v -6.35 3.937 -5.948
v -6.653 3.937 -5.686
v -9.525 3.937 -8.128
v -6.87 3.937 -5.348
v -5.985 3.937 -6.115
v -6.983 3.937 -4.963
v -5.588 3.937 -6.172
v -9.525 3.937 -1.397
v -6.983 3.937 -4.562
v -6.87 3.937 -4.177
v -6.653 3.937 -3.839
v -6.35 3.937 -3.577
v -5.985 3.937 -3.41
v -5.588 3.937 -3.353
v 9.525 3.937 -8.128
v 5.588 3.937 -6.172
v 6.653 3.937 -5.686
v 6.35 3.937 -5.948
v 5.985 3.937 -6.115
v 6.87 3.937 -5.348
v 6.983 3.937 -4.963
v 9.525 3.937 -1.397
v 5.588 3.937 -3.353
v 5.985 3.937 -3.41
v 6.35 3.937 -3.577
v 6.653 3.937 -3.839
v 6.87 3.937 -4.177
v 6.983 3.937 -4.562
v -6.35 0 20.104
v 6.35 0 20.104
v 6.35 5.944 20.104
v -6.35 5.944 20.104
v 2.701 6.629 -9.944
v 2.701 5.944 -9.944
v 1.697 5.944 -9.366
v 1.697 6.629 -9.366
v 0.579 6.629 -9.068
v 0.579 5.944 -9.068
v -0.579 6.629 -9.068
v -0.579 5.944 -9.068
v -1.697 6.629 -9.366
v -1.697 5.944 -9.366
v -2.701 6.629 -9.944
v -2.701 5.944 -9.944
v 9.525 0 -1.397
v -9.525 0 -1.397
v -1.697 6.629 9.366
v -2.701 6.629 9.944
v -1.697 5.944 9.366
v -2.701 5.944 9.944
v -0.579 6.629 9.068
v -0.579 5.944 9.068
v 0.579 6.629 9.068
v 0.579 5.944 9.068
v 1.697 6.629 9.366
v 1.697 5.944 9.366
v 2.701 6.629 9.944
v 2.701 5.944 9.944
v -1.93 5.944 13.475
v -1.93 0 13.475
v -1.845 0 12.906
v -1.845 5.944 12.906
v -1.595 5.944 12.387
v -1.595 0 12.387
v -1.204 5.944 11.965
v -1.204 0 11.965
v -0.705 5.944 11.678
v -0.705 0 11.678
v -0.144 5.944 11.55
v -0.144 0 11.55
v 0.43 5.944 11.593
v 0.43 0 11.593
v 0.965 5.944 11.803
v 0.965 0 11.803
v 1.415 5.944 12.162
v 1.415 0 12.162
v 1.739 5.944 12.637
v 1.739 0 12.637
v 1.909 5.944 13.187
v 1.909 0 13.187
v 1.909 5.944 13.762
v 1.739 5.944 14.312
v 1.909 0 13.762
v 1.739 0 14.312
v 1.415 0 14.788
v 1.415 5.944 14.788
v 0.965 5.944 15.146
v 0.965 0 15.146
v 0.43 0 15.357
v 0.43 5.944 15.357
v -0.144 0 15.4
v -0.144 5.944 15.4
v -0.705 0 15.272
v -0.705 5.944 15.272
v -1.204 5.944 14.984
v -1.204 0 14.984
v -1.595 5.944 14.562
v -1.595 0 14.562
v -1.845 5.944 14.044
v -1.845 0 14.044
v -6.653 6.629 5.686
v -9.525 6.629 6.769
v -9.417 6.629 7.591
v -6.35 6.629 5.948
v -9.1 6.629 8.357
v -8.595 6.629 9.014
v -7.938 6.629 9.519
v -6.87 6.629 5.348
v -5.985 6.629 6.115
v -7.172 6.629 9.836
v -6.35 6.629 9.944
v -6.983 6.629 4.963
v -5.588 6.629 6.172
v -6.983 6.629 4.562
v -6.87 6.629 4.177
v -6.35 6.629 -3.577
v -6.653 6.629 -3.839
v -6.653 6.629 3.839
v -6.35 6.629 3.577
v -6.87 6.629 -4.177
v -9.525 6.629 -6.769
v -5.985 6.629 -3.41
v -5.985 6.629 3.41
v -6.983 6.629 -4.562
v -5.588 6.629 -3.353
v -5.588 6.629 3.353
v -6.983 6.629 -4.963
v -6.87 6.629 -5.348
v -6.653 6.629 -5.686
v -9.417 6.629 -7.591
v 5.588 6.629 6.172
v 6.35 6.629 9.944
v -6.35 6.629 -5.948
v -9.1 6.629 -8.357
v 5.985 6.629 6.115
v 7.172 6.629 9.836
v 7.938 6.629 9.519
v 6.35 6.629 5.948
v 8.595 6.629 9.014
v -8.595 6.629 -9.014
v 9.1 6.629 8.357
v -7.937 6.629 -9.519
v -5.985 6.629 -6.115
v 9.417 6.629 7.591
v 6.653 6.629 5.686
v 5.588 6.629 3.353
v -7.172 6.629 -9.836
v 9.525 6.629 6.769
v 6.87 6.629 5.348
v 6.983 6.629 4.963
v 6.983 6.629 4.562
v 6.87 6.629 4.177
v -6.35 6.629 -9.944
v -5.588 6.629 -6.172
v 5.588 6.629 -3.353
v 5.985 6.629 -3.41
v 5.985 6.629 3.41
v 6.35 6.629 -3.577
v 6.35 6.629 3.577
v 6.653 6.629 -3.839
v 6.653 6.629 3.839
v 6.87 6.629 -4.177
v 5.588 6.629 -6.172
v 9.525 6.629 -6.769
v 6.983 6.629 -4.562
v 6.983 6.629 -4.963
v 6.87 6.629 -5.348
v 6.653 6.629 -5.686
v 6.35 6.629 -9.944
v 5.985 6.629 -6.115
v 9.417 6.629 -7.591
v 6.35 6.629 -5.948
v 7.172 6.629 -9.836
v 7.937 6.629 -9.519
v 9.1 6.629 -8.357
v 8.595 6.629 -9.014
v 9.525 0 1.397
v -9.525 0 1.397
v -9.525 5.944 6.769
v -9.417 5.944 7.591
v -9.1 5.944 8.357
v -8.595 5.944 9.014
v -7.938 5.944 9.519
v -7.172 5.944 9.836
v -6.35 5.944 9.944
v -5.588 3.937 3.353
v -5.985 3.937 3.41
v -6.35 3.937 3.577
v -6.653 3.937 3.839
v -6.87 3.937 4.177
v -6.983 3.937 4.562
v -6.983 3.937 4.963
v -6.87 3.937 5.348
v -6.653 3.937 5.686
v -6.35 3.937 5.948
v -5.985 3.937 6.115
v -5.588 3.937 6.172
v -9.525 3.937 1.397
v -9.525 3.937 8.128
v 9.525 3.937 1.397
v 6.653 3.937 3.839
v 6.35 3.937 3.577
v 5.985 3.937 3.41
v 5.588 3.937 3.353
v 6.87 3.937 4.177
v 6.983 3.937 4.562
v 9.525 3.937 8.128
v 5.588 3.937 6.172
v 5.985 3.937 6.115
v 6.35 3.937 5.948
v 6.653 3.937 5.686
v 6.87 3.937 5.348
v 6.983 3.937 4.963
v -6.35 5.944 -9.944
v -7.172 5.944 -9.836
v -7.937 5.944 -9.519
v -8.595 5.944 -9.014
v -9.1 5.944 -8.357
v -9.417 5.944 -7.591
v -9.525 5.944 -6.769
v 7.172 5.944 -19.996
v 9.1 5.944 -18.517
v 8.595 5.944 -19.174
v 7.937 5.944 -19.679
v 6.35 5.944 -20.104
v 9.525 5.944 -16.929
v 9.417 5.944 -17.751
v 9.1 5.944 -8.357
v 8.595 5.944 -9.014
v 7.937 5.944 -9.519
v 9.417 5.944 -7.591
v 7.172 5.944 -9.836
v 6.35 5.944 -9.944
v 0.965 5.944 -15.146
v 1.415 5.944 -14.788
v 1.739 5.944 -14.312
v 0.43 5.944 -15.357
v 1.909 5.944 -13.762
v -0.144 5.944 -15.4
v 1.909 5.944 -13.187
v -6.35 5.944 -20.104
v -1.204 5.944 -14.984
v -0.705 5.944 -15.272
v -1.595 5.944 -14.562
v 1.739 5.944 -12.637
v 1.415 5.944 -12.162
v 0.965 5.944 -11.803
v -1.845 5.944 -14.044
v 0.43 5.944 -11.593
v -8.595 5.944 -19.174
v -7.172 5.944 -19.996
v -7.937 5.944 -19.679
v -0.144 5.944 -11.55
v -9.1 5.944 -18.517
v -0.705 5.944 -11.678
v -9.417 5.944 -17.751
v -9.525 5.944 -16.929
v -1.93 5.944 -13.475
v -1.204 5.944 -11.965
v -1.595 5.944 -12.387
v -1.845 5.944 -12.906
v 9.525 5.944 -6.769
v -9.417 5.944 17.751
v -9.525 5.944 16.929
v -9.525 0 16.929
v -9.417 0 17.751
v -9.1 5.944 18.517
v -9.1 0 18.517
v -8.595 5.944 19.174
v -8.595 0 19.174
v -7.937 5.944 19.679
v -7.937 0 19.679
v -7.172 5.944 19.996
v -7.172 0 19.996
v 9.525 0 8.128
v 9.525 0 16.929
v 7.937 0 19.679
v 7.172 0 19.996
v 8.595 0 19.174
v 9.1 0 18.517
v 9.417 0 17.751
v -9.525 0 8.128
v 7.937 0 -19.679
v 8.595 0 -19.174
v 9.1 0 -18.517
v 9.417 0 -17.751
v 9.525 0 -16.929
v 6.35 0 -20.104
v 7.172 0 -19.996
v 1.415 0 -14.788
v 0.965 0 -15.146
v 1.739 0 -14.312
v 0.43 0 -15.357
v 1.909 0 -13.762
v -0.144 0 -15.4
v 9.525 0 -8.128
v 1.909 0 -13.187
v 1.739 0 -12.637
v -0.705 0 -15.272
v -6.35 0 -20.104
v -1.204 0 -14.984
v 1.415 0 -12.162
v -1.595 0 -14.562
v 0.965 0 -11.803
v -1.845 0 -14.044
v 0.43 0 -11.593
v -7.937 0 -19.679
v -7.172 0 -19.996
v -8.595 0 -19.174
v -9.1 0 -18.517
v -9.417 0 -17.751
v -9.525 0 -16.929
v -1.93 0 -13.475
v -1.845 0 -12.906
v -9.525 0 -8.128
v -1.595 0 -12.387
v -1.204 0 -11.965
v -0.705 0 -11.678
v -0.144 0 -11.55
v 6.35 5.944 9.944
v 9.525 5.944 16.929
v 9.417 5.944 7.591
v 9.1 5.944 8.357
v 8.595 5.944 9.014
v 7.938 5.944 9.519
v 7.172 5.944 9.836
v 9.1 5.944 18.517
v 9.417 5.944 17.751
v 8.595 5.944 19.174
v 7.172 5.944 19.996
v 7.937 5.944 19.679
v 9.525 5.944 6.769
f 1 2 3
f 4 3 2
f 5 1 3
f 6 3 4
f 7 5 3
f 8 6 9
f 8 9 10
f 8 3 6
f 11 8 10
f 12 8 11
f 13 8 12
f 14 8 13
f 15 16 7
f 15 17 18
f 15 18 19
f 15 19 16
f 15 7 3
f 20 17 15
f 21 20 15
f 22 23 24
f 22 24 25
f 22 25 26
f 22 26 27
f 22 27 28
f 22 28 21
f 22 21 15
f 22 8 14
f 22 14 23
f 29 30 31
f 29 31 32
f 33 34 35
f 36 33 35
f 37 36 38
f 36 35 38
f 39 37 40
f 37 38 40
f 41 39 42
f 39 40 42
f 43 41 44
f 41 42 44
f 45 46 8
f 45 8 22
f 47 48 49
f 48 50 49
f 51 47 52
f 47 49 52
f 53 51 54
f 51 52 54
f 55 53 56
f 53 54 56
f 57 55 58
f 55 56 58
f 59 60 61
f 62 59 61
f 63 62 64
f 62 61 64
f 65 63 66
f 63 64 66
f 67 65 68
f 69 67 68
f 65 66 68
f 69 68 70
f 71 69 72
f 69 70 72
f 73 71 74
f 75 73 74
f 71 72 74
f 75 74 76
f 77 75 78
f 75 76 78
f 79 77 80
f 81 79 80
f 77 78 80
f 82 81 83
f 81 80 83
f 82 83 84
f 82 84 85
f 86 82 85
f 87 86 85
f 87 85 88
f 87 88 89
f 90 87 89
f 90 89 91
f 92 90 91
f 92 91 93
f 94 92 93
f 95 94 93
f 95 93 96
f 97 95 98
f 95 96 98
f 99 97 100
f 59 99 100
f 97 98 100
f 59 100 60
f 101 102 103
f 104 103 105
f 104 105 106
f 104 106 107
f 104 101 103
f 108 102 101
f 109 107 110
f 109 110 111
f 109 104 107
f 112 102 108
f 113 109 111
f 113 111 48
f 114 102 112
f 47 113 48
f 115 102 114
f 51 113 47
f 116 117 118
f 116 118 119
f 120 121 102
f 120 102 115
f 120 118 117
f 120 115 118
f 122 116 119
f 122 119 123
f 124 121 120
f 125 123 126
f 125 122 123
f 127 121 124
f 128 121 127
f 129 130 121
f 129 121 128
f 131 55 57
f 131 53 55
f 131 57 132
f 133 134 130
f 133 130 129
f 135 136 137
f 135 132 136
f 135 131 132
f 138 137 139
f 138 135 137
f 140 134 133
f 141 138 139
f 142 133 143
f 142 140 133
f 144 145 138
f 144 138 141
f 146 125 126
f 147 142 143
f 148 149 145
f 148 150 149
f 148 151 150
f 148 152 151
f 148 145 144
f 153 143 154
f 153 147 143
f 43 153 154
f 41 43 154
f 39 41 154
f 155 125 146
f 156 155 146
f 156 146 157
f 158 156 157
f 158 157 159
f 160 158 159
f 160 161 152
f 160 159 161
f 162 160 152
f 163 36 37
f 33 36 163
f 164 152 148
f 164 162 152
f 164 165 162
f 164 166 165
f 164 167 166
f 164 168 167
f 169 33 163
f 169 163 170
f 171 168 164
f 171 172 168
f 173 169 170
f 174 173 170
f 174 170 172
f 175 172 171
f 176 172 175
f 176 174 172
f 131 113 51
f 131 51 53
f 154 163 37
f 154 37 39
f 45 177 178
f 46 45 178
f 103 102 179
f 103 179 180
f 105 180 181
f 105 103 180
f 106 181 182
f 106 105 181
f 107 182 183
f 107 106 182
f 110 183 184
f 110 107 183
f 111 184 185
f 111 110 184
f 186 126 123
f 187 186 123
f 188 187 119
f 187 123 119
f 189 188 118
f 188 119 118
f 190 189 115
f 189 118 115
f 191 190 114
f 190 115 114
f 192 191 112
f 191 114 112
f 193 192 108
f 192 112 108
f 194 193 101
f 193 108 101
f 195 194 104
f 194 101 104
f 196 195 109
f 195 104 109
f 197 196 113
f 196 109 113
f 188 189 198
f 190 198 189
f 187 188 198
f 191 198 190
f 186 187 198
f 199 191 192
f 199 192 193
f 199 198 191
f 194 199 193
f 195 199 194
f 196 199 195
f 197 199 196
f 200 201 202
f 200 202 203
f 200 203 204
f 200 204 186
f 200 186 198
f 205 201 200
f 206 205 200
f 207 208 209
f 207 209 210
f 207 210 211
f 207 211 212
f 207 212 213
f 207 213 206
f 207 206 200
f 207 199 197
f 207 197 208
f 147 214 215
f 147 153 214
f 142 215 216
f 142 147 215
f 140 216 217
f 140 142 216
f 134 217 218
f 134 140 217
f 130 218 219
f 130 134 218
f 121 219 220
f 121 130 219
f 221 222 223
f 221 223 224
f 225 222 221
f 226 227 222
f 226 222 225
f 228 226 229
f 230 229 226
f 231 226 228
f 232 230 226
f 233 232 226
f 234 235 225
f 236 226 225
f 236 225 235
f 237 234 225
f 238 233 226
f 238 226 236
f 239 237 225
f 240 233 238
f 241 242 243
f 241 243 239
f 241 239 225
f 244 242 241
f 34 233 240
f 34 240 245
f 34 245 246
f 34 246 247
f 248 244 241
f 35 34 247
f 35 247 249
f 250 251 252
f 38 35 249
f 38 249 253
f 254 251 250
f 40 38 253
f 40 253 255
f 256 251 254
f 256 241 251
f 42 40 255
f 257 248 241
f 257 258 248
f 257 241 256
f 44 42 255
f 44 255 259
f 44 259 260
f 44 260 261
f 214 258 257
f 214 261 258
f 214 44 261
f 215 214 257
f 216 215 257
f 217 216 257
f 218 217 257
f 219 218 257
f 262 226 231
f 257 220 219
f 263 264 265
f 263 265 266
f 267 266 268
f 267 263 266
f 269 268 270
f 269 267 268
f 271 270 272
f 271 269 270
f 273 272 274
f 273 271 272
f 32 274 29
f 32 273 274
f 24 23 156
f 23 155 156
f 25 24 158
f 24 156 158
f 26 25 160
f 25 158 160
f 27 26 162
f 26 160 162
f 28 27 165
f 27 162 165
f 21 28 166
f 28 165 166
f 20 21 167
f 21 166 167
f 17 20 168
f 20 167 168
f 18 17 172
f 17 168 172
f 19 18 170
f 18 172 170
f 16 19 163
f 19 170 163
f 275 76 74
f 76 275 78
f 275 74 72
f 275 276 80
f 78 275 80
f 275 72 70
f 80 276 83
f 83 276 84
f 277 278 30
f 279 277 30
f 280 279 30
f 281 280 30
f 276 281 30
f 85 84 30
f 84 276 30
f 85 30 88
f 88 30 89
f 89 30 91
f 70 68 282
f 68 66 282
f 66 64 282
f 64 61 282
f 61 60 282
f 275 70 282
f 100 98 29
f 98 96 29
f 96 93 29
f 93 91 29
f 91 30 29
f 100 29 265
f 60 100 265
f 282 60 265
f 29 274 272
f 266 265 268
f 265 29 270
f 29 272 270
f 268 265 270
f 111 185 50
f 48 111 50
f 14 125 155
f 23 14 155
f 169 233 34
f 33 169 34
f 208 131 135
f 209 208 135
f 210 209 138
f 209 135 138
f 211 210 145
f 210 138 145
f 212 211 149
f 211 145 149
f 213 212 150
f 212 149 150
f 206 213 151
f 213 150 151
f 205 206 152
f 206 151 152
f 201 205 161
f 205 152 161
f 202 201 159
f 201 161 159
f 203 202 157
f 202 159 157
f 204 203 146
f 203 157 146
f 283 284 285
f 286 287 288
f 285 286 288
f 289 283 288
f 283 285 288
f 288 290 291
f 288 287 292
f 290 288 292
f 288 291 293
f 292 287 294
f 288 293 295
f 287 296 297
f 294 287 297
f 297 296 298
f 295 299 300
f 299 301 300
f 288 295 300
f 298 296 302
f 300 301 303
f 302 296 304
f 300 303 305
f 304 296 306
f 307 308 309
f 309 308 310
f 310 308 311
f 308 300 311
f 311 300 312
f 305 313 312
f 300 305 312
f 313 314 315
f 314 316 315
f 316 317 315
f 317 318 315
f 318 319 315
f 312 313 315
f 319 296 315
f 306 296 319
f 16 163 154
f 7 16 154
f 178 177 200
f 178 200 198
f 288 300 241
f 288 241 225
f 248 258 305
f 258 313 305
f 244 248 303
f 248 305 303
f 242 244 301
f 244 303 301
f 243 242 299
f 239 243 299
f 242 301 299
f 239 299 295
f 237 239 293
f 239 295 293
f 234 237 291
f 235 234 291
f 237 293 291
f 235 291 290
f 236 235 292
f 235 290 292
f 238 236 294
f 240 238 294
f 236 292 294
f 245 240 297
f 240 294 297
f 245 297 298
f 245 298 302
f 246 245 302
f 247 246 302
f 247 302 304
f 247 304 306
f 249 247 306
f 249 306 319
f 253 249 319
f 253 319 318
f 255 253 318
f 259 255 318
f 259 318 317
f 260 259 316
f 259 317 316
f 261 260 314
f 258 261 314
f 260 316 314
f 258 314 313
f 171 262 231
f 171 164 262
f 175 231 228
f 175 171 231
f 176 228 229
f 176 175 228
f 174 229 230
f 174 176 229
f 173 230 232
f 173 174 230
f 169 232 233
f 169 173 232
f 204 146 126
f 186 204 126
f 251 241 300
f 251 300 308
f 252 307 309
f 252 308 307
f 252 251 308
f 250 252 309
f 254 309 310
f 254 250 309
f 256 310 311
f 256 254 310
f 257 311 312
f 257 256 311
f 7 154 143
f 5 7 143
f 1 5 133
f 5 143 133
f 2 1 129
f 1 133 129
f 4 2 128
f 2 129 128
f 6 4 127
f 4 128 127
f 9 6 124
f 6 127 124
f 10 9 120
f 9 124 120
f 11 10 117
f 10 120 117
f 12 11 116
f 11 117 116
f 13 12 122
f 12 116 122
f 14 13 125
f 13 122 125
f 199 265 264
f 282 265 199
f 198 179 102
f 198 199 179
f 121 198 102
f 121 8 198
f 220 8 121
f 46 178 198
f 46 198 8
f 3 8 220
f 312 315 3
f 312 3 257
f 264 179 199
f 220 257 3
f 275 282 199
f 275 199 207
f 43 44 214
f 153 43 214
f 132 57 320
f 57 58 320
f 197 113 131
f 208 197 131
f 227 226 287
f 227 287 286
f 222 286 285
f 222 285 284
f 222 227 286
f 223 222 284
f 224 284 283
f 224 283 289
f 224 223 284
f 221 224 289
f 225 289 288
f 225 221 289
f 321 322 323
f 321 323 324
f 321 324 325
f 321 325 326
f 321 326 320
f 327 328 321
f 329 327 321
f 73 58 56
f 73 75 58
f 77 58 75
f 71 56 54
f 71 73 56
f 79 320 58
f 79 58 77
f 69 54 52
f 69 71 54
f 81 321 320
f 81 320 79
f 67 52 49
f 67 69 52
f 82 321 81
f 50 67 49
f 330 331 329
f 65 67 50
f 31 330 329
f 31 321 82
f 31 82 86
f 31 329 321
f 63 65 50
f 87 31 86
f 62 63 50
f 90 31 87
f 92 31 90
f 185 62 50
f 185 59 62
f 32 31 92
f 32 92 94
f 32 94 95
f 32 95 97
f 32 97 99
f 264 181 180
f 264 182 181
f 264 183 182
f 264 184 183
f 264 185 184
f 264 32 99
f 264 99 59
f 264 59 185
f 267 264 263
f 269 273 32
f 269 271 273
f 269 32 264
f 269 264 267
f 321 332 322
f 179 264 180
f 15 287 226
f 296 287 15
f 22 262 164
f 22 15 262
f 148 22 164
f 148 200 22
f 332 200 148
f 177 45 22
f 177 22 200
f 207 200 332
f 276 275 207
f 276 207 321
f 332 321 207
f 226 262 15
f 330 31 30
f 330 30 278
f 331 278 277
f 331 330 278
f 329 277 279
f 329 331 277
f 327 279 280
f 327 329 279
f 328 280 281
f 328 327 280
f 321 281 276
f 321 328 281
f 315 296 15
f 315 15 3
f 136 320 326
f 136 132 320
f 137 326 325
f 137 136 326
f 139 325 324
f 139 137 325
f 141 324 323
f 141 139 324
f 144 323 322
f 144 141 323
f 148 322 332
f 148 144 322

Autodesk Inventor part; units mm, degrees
ref_plane "XZ Plane" through (0, 0, 0) normal (0, 1, 0) x (-1, 0, 0)
sketch "Sketch1" plane through (0, 0, 0) normal (0, 1, 0) x (-1, 0, 0)
  line L0 (-9.525, 20.1041) -> (9.525, 20.1041)
  line L1 (9.525, 20.1041) -> (9.525, -20.1041)
  line L2 (9.525, -20.1041) -> (-9.525, -20.1041)
  line L3 (-9.525, -20.1041) -> (-9.525, 20.1041)
  line L4 (-9.525, 20.1041) -> (9.525, -20.1041) construction
  line L5 (9.525, 20.1041) -> (-9.525, -20.1041) construction
  line L6 (-5.3594, 9.9441) -> (5.3594, 9.9441) construction
  line L7 (5.3594, 9.9441) -> (5.3594, -9.9441) construction
  line L8 (5.3594, -9.9441) -> (-5.3594, -9.9441) construction
  line L9 (-5.3594, -9.9441) -> (-5.3594, 9.9441) construction
  line L10 (-5.3594, 9.9441) -> (5.3594, -9.9441) construction
  line L11 (5.3594, 9.9441) -> (-5.3594, -9.9441) construction
  circle A0 centre (0, 13.4747) radius 1.9304
  circle A1 centre (0, 13.4747) radius 4.445 construction
  circle A2 centre (0, -13.4747) radius 1.9304
  circle A3 centre (0, -13.4747) radius 4.445 construction
  line L12 (9.525, 0) -> (-9.525, 0) construction
  point P0 (0, 0)
  dimension "d0" = 19.05
  dimension "d1" = 40.2082
  dimension "d2" = 10.7188
  dimension "d3" = 19.8882
  dimension "d5" = 3.8608
  dimension "d7" = 8.89
  dimension "d8" = 3.8608
  dimension "d10" = 8.89
  dimension "d33" = 26.9494
extrude "TNutMount" add sketch "Sketch1" along normal blind 5.9436
sketch "Sketch2" plane through (0, 5.9436, 0) normal (0, 1, 0) x (1, 0, 0)
  line L0 (-9.525, -9.9441) -> (9.525, -9.9441)
  line L1 (9.525, -9.9441) -> (9.525, 9.9441)
  line L2 (9.525, 9.9441) -> (-9.525, 9.9441)
  line L3 (-9.525, 9.9441) -> (-9.525, -9.9441)
  line L4 (-9.525, -9.9441) -> (9.525, 9.9441) construction
  line L5 (9.525, -9.9441) -> (-9.525, 9.9441) construction
  point P0 (0, 0)
  dimension "d13" = 19.05
  dimension "d14" = 19.8882
extrude "SwitchMount" add sketch "Sketch2" along normal blind 0.6858
sketch "Sketch3" plane through (0, 6.6294, 0) normal (0, 1, 0) x (1, 0, 0)
  line L0 (5.588, -4.7625) -> (-5.588, -4.7625) construction
  line L1 (-5.588, -4.7625) -> (-5.588, 4.7625) construction
  line L2 (-5.588, 4.7625) -> (5.588, 4.7625) construction
  line L3 (5.588, 4.7625) -> (5.588, -4.7625) construction
  line L4 (5.588, -4.7625) -> (-5.588, 4.7625) construction
  line L5 (-5.588, -4.7625) -> (5.588, 4.7625) construction
  line L6 (-5.588, 4.7625) -> (5.588, 4.7625) construction
  line L7 (-5.588, 3.3528) -> (5.588, 3.3528)
  line L8 (5.588, 6.1722) -> (-5.588, 6.1722)
  arc A0 (-5.588, 6.1722) -> (-5.588, 3.3528) centre (-5.588, 4.7625) ccw
  arc A1 (5.588, 3.3528) -> (5.588, 6.1722) centre (5.588, 4.7625) ccw
  line L9 (-5.588, -4.7625) -> (5.588, -4.7625) construction
  line L10 (-5.588, -6.1722) -> (5.588, -6.1722)
  line L11 (5.588, -3.3528) -> (-5.588, -3.3528)
  arc A2 (-5.588, -3.3528) -> (-5.588, -6.1722) centre (-5.588, -4.7625) ccw
  arc A3 (5.588, -6.1722) -> (5.588, -3.3528) centre (5.588, -4.7625) ccw
  point P0 (0, 0)
  point P1 (0, 4.7625)
  point P2 (0, -4.7625)
  dimension "d19" = 11.176
  dimension "d20" = 9.525
  dimension "d21" = 2.8194
  dimension "d22" = 2.8194
extrude "ScrewSlot" cut sketch "Sketch3" against normal through all
sketch "Sketch4" plane through (0, 0, 0) normal (0, -1, 0) x (1, 0, 0)
  arc A0 (5.588, -6.1722) -> (5.588, -3.3528) centre (5.588, -4.7625) ccw projected
  arc A1 (-5.588, -3.3528) -> (-5.588, -6.1722) centre (-5.588, -4.7625) ccw projected
  line L0 (5.588, -4.7625) -> (-5.588, -4.7625) construction
  arc A2 (5.588, 3.3528) -> (5.588, 6.1722) centre (5.588, 4.7625) ccw construction
  arc A3 (-5.588, 6.1722) -> (-5.588, 3.3528) centre (-5.588, 4.7625) ccw construction
  line L1 (5.588, 4.7625) -> (-5.588, 4.7625) construction
  line L2 (-9.525, -1.397) -> (9.525, -1.397)
  line L3 (9.525, -1.397) -> (9.525, -8.128)
  line L4 (9.525, -8.128) -> (-9.525, -8.128)
  line L5 (-9.525, -8.128) -> (-9.525, -1.397)
  line L6 (-9.525, -1.397) -> (9.525, -8.128) construction
  line L7 (9.525, -1.397) -> (-9.525, -8.128) construction
  line L8 (-9.525, 8.128) -> (9.525, 8.128)
  line L9 (9.525, 8.128) -> (9.525, 1.397)
  line L10 (9.525, 1.397) -> (-9.525, 1.397)
  line L11 (-9.525, 1.397) -> (-9.525, 8.128)
  line L12 (-9.525, 8.128) -> (9.525, 1.397) construction
  line L13 (9.525, 8.128) -> (-9.525, 1.397) construction
  point P0 (0, 0)
  point P1 (0, -4.7625)
  point P2 (0, 4.7625)
  dimension "d25" = 19.05
  dimension "d26" = 6.731
  dimension "d27" = 19.05
  dimension "d28" = 6.731
extrude "Extrusion4" cut sketch "Sketch4" against normal blind 3.937
fillet "Fillet1" radius 3.175 8 edges at (9.525, 2.9718, 20.1041) (9.525, 2.9718, -20.1041) (-9.525, 2.9718, 20.1041) (-9.525, 2.9718, -20.1041) (9.525, 6.2865, -9.9441) (9.525, 6.2865, 9.9441) (-9.525, 6.2865, -9.9441) (-9.525, 6.2865, 9.9441)
sketch "Sketch5" plane through (0, 5.9436, 0) normal (0, 1, 0) x (1, 0, 0)
  circle A0 centre (0, 13.4747) radius 1.9304 projected
  circle A1 centre (0, 13.4747) radius 4.445
  circle A2 centre (0, -13.4747) radius 1.9304 projected
  circle A3 centre (0, -13.4747) radius 4.445
  point P0 (0, 0)
  dimension "d36" = 8.89
  dimension "d37" = 8.89
extrude "Extrusion5" cut sketch "Sketch5" along normal up to surface (0.6858 mm away)
properties part number "limit switch mount to xrail"
